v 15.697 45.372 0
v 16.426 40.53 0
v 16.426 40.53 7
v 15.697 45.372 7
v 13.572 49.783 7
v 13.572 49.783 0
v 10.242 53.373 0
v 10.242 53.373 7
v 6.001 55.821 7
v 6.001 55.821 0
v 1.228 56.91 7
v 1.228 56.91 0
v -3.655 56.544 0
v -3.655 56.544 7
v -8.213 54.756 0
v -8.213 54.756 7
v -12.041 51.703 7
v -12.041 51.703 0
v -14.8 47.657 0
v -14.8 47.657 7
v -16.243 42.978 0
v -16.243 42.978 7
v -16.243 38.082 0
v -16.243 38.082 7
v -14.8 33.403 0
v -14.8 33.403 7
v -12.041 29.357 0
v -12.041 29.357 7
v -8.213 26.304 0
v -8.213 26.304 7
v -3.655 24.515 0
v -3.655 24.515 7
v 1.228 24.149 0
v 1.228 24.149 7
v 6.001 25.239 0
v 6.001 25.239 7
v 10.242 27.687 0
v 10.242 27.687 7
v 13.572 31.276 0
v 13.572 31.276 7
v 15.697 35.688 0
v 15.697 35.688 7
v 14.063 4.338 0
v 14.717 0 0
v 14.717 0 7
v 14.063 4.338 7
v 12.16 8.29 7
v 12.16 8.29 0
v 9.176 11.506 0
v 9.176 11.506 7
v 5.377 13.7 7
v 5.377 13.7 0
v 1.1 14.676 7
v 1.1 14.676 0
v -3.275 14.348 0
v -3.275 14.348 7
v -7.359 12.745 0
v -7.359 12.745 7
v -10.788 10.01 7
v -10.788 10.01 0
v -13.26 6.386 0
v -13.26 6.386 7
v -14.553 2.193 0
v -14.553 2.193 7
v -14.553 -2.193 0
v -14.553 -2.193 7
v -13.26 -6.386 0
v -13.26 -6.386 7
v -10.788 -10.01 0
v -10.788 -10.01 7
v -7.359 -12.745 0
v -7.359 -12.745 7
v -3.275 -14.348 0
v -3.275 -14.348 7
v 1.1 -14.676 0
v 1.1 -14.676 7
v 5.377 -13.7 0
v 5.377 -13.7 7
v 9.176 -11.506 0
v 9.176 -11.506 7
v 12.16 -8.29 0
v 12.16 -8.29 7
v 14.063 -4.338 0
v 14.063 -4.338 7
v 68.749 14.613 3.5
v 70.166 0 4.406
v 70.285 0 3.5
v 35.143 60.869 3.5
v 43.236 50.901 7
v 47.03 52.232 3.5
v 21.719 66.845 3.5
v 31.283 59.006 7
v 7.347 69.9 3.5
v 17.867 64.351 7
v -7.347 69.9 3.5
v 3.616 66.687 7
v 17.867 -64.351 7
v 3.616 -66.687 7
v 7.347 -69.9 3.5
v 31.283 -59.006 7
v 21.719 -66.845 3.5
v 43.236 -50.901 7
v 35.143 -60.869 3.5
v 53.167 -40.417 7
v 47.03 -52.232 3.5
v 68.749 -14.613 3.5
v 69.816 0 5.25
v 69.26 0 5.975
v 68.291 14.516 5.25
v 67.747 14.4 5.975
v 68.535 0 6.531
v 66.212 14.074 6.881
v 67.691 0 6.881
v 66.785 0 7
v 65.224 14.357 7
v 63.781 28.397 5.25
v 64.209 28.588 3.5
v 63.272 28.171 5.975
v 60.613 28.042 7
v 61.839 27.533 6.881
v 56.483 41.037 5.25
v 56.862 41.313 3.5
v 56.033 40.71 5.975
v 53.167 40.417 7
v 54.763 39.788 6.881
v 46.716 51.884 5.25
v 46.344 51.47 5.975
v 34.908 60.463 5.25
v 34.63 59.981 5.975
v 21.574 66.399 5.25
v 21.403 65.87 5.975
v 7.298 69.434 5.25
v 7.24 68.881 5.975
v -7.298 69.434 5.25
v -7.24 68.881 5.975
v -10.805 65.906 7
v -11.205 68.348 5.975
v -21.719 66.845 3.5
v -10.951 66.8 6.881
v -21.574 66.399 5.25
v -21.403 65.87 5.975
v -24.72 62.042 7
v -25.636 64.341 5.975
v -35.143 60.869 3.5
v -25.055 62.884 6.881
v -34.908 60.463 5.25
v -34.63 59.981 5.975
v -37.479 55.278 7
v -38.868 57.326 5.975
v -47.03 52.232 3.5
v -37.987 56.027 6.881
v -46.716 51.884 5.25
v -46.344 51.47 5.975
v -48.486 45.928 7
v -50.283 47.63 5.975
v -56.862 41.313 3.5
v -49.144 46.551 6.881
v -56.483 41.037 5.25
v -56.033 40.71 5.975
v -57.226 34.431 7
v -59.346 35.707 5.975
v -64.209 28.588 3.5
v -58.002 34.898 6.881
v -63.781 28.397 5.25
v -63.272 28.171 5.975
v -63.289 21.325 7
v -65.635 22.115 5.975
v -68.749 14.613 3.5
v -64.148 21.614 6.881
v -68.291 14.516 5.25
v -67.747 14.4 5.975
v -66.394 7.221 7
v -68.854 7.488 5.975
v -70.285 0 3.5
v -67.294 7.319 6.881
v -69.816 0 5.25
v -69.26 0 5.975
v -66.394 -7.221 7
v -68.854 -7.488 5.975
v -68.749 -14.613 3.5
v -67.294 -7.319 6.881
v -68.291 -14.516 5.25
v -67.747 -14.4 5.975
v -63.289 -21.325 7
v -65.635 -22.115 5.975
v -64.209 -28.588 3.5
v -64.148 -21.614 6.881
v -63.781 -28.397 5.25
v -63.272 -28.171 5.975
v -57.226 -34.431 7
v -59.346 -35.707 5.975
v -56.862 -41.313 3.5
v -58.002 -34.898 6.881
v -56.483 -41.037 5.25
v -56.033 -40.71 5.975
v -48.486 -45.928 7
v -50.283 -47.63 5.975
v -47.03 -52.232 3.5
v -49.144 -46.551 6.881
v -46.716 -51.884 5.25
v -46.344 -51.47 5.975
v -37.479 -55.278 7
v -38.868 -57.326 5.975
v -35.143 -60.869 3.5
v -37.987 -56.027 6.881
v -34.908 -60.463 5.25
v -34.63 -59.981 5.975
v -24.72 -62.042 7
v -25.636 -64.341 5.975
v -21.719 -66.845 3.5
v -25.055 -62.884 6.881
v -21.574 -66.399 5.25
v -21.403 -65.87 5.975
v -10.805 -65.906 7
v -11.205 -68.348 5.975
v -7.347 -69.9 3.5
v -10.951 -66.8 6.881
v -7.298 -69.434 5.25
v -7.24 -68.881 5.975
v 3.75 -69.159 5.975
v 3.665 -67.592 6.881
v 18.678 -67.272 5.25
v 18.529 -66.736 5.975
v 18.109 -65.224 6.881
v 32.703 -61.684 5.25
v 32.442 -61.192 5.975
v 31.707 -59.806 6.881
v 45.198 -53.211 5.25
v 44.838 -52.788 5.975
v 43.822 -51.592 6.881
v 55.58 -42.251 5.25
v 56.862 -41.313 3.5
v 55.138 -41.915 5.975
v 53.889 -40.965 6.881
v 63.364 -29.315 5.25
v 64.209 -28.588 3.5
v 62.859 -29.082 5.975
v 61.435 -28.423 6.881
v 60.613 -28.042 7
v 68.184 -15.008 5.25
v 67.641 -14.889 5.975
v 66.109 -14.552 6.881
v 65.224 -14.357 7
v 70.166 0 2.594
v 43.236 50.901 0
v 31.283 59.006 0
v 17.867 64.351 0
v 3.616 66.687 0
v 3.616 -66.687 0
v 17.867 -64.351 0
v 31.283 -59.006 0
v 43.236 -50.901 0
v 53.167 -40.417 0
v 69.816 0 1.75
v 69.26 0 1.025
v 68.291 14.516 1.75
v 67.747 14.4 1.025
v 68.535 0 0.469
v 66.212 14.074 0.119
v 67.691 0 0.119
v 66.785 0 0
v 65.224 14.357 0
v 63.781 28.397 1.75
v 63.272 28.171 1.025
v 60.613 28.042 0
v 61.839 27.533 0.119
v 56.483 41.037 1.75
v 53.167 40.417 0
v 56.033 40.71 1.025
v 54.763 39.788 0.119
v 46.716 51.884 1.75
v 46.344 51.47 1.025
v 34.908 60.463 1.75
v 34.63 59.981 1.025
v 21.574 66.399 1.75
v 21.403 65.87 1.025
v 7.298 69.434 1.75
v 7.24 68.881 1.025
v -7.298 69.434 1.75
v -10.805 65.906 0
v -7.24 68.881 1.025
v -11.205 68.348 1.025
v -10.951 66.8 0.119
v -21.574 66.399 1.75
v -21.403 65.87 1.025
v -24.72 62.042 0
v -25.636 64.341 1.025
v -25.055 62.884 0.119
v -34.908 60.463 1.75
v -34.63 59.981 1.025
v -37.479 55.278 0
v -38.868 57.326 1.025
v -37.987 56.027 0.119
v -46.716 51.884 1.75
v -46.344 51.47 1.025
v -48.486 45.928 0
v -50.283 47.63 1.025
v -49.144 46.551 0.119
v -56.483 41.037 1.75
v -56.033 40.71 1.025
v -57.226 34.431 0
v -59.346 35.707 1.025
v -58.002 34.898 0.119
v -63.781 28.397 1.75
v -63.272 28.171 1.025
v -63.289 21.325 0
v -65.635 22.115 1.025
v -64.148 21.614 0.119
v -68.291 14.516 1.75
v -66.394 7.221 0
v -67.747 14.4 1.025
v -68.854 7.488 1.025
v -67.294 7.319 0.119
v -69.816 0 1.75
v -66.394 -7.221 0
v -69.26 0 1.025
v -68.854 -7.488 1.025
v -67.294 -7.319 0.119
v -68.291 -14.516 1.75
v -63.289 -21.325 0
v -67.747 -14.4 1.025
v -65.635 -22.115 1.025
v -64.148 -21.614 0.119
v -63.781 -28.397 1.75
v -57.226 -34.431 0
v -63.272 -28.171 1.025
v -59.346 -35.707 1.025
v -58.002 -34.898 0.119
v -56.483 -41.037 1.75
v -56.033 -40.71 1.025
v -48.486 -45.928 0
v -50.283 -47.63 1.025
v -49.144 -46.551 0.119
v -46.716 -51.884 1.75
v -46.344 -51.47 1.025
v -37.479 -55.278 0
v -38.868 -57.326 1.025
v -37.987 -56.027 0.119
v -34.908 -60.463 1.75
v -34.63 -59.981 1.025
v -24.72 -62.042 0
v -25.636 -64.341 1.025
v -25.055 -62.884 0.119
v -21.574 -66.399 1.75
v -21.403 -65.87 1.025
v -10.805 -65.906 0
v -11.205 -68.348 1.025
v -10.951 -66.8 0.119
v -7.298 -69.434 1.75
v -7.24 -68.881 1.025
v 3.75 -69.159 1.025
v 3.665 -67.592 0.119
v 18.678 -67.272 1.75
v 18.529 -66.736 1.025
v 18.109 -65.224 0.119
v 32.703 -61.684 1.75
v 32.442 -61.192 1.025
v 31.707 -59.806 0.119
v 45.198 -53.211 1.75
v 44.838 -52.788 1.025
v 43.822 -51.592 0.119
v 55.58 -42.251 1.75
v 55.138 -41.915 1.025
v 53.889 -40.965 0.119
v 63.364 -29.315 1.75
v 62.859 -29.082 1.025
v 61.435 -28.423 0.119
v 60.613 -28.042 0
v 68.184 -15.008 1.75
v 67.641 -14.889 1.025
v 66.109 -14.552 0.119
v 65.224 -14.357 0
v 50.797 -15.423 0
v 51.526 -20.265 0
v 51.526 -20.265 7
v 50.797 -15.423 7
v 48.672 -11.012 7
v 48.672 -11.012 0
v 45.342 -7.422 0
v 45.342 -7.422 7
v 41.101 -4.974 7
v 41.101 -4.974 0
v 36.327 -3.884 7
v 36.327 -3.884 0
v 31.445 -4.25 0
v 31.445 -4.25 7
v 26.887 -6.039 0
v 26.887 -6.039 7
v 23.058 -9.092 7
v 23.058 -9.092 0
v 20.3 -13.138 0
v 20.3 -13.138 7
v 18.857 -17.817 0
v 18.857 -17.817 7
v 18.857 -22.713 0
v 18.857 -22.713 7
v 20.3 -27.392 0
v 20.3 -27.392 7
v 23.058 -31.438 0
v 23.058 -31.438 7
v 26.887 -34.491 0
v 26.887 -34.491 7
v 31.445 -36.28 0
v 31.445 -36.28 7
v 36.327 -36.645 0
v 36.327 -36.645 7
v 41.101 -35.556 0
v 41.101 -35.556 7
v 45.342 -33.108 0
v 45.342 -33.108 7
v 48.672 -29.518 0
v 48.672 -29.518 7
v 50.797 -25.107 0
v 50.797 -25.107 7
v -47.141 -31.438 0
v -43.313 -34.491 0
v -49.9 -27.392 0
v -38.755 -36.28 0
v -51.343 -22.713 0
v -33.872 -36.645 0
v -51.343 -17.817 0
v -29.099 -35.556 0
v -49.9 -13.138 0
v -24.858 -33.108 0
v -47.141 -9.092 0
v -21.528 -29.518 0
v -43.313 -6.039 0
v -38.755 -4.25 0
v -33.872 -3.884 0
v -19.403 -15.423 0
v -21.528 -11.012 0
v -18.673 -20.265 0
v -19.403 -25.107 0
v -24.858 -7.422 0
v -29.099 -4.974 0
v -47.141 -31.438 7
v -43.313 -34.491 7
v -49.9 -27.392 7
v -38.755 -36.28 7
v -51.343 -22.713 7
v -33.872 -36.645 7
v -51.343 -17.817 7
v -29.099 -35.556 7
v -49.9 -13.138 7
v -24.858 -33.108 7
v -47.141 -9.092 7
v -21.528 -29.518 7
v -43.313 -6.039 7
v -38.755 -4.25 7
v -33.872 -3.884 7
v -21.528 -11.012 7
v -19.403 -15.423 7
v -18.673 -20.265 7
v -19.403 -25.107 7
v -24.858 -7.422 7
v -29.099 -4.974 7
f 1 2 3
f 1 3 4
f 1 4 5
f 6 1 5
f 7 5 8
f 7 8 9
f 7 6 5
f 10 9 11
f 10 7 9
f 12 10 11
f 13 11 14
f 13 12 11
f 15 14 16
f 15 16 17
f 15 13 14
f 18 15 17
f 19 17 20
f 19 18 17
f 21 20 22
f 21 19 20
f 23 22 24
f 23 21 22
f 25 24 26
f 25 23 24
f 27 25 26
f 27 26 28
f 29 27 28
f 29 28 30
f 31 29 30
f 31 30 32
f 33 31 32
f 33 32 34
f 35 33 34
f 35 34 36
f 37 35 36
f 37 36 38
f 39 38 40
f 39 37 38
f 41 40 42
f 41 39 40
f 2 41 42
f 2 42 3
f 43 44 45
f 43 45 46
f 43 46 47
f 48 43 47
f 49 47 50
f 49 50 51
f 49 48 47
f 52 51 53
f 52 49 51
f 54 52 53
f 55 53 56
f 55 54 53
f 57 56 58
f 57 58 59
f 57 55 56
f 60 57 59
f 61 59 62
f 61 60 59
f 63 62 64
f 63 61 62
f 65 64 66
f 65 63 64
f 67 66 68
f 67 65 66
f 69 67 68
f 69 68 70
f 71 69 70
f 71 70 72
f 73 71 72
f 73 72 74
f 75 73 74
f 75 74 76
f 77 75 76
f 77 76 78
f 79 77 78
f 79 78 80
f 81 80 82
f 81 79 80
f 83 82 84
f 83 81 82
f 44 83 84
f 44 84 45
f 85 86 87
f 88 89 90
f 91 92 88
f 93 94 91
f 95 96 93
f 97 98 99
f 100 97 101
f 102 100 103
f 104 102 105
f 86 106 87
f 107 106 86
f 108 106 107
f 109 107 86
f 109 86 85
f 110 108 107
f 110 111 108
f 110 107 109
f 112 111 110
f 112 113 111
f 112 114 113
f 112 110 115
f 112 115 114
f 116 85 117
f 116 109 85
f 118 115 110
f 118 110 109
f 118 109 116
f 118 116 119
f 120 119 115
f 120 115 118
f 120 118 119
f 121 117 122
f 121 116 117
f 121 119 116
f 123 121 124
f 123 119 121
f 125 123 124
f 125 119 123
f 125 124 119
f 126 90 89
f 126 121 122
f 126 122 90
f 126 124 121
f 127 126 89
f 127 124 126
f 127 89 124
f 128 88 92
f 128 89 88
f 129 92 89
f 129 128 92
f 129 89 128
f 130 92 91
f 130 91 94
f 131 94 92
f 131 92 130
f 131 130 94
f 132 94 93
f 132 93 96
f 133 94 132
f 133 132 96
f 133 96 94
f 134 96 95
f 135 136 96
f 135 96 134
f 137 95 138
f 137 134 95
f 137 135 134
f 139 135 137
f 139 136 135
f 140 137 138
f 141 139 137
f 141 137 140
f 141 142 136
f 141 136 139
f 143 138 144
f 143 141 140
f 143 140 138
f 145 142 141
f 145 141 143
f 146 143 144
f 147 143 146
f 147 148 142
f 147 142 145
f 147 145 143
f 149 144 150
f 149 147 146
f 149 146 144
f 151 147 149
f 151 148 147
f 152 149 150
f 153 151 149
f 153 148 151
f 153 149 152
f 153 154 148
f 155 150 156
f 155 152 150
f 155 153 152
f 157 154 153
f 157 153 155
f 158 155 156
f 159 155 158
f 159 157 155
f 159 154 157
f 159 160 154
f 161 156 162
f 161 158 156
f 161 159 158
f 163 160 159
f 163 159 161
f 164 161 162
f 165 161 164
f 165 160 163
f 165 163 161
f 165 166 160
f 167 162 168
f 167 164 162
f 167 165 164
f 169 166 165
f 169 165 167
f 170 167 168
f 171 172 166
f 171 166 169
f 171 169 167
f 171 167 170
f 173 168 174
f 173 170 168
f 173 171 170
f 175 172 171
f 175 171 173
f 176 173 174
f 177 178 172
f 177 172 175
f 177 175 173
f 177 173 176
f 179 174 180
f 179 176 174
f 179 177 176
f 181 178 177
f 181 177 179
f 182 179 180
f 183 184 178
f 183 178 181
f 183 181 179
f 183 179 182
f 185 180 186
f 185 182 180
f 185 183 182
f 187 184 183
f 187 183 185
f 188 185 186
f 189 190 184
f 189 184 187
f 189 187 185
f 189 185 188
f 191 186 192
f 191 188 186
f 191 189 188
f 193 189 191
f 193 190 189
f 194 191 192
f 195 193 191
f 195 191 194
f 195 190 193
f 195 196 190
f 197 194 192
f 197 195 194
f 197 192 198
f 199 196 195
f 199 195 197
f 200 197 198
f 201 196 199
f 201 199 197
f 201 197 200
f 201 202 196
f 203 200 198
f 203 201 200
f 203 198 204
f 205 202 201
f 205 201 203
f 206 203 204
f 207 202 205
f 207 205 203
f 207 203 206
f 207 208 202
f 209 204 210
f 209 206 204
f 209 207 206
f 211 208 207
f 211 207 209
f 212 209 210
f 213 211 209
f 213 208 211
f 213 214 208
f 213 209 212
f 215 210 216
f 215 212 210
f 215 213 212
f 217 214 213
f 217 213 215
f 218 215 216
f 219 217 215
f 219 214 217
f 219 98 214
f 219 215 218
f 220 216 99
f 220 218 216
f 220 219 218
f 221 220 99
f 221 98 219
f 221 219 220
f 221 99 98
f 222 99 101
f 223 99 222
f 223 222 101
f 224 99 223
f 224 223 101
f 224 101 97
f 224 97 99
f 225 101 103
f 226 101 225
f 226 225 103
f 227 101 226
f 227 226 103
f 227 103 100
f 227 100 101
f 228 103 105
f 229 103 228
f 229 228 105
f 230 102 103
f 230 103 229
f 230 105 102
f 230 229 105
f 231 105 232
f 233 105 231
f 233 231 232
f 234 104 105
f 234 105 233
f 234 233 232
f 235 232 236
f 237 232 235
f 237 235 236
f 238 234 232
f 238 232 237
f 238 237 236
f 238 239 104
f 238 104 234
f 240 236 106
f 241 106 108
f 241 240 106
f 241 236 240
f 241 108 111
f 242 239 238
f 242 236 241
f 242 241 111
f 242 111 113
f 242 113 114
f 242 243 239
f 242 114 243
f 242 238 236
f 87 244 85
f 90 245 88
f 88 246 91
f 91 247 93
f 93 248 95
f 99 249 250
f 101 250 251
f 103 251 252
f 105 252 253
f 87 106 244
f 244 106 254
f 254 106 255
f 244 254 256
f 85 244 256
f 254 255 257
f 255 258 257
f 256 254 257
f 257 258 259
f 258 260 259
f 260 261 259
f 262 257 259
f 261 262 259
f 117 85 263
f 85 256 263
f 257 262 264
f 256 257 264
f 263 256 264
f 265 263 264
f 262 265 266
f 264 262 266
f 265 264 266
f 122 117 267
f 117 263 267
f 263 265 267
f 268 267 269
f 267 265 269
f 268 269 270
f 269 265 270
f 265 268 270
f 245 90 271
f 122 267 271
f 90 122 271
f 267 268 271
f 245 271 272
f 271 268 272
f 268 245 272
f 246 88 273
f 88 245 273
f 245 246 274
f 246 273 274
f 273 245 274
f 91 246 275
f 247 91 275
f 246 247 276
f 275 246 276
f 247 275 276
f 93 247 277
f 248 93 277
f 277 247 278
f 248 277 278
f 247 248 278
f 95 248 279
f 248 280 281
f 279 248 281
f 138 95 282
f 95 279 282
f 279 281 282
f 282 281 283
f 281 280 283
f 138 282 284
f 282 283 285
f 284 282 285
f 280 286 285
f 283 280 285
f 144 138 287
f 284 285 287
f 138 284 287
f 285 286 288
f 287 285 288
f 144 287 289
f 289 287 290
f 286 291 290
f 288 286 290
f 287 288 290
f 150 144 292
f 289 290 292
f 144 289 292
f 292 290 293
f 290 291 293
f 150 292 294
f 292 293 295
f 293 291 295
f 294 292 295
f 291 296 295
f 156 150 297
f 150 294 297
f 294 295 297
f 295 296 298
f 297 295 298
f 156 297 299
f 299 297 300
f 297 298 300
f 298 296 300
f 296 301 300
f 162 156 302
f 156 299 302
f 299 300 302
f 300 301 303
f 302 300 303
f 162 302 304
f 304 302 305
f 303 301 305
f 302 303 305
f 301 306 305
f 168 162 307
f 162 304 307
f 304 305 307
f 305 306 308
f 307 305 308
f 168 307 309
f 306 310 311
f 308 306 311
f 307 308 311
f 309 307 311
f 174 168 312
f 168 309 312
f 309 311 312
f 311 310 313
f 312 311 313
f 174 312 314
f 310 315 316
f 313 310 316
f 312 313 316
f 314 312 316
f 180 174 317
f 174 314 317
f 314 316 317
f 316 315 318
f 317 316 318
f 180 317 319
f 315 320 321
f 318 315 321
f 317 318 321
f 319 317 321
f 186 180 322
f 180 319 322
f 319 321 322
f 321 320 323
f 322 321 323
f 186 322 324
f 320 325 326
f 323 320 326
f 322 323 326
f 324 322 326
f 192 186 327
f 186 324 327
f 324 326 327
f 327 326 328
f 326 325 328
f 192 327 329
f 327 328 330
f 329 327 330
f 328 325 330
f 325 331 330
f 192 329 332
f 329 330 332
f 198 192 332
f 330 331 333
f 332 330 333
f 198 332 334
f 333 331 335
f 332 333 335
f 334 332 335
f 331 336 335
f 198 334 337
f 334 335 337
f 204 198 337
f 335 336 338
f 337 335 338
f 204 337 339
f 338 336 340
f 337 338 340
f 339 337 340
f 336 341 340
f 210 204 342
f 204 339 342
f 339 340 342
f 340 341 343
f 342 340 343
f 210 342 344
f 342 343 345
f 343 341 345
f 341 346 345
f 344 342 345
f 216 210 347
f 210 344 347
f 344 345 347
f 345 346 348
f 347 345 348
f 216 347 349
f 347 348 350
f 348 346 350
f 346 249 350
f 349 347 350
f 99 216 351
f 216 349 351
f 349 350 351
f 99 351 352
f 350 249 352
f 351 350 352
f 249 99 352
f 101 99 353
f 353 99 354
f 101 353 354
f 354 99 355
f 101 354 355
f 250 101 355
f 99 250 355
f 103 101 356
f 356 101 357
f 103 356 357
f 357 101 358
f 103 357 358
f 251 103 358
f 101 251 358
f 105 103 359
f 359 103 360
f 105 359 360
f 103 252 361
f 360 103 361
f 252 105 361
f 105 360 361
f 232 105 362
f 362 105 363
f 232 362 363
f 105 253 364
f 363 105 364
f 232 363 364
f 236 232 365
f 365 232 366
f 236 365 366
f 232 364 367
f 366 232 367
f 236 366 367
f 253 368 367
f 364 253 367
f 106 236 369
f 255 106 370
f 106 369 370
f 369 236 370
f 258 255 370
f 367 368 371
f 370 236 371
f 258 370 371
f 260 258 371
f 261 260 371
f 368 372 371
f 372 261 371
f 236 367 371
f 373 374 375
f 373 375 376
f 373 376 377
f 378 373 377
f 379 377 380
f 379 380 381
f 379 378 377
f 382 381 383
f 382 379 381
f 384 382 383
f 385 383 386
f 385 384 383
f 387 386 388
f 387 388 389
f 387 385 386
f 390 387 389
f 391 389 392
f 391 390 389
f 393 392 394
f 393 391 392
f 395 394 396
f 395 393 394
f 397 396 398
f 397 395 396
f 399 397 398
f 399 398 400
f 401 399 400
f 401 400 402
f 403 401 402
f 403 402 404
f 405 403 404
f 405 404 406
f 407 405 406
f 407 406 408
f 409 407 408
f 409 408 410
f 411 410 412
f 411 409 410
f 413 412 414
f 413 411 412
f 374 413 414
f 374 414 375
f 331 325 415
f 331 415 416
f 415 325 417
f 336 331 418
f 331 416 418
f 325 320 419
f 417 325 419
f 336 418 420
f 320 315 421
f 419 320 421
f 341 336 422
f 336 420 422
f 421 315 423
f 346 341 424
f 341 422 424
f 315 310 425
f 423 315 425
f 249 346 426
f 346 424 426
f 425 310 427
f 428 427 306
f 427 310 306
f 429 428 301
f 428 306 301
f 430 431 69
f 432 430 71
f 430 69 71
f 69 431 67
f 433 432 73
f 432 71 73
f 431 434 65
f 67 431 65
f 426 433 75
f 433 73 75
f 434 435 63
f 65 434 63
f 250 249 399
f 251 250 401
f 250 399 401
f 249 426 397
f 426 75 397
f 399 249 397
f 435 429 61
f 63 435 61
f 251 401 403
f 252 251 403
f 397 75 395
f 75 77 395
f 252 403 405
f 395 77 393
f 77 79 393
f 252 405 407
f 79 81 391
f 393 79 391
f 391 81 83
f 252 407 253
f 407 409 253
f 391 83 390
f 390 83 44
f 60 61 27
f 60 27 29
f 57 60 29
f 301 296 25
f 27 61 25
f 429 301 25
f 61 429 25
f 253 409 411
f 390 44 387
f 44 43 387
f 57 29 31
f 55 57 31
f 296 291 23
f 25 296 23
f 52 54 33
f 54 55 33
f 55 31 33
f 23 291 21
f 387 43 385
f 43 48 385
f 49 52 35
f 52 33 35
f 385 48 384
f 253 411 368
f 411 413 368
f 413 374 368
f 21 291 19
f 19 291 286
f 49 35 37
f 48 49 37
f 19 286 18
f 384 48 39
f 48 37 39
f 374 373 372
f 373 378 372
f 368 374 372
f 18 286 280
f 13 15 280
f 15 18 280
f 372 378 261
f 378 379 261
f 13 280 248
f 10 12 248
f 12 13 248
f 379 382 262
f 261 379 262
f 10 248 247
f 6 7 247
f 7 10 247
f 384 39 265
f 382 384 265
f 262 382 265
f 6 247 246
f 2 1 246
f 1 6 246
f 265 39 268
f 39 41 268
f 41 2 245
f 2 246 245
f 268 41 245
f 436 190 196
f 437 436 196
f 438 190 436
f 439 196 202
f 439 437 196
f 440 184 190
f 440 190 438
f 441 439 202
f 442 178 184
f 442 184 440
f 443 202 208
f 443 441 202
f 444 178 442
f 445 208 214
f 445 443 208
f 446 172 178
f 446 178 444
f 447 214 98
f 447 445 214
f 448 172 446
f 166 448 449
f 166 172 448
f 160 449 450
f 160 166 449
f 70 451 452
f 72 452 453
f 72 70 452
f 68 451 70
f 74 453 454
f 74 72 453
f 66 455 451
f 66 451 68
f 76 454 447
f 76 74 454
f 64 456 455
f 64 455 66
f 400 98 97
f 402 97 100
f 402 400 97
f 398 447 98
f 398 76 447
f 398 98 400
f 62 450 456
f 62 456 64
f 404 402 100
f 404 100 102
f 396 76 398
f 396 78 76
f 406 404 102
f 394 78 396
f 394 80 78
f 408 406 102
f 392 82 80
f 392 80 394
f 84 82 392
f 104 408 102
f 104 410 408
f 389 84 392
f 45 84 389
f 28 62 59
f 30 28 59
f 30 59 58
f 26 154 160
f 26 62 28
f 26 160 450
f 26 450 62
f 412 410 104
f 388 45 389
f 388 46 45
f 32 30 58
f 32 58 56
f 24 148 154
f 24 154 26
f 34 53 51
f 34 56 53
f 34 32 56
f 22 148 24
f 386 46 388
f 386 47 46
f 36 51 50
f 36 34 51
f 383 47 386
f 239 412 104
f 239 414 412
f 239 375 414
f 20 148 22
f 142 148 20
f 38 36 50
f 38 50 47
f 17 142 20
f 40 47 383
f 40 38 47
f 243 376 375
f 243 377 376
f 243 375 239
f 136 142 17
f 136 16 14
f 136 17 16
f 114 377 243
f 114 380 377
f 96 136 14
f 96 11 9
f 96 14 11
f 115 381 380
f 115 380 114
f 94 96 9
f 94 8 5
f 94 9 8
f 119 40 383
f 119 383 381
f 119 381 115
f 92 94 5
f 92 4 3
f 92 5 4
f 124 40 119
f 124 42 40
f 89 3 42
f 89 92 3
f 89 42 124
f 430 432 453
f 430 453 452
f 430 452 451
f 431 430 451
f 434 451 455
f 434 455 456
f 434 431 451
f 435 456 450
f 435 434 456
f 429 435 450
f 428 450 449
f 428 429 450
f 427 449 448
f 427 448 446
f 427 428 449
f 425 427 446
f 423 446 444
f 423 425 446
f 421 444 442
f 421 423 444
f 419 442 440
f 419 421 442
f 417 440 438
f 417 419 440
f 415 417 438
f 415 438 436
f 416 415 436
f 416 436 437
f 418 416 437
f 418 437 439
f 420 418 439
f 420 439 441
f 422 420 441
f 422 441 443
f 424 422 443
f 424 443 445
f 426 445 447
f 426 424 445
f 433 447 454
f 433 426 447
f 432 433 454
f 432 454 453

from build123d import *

# Parameters (mm, degrees)
F0_R     = 70.2853794577
F0_R_2   = 16.4264849476
F0_R_3   = 14.7171878195
F1_DEPTH = 7
F2_R     = 3.49999


# Not quite as in the source:
# - a fillet or chamfer is up to 0.001 mm smaller than in the source, because OpenCascade refuses the exact size


with BuildPart() as f1:
    # F0 (on Top) → F1 (new body)
    with BuildSketch(Plane.XY):
        Circle(F0_R)
        with Locations((-35.0998191676, -20.2648900449)):
            Circle(F0_R_2, mode=Mode.SUBTRACT)
        Circle(F0_R_3, mode=Mode.SUBTRACT)
        with Locations((35.0998191676, -20.2648900449)):
            Circle(F0_R_2, mode=Mode.SUBTRACT)
        with Locations((0, 40.5297800899)):
            Circle(F0_R_2, mode=Mode.SUBTRACT)
    extrude(amount=F1_DEPTH)

    # F2 (radius 3.5 in the source; OpenCascade refuses exactly that, so slightly less here)
    f2_edges = [f1.edges().sort_by_distance(p)[0] for p in [
        (-70.285379, 0, 7),
        (-70.285379, 0, 0),
    ]]
    fillet(f2_edges, radius=F2_R)


solid = f1.part
